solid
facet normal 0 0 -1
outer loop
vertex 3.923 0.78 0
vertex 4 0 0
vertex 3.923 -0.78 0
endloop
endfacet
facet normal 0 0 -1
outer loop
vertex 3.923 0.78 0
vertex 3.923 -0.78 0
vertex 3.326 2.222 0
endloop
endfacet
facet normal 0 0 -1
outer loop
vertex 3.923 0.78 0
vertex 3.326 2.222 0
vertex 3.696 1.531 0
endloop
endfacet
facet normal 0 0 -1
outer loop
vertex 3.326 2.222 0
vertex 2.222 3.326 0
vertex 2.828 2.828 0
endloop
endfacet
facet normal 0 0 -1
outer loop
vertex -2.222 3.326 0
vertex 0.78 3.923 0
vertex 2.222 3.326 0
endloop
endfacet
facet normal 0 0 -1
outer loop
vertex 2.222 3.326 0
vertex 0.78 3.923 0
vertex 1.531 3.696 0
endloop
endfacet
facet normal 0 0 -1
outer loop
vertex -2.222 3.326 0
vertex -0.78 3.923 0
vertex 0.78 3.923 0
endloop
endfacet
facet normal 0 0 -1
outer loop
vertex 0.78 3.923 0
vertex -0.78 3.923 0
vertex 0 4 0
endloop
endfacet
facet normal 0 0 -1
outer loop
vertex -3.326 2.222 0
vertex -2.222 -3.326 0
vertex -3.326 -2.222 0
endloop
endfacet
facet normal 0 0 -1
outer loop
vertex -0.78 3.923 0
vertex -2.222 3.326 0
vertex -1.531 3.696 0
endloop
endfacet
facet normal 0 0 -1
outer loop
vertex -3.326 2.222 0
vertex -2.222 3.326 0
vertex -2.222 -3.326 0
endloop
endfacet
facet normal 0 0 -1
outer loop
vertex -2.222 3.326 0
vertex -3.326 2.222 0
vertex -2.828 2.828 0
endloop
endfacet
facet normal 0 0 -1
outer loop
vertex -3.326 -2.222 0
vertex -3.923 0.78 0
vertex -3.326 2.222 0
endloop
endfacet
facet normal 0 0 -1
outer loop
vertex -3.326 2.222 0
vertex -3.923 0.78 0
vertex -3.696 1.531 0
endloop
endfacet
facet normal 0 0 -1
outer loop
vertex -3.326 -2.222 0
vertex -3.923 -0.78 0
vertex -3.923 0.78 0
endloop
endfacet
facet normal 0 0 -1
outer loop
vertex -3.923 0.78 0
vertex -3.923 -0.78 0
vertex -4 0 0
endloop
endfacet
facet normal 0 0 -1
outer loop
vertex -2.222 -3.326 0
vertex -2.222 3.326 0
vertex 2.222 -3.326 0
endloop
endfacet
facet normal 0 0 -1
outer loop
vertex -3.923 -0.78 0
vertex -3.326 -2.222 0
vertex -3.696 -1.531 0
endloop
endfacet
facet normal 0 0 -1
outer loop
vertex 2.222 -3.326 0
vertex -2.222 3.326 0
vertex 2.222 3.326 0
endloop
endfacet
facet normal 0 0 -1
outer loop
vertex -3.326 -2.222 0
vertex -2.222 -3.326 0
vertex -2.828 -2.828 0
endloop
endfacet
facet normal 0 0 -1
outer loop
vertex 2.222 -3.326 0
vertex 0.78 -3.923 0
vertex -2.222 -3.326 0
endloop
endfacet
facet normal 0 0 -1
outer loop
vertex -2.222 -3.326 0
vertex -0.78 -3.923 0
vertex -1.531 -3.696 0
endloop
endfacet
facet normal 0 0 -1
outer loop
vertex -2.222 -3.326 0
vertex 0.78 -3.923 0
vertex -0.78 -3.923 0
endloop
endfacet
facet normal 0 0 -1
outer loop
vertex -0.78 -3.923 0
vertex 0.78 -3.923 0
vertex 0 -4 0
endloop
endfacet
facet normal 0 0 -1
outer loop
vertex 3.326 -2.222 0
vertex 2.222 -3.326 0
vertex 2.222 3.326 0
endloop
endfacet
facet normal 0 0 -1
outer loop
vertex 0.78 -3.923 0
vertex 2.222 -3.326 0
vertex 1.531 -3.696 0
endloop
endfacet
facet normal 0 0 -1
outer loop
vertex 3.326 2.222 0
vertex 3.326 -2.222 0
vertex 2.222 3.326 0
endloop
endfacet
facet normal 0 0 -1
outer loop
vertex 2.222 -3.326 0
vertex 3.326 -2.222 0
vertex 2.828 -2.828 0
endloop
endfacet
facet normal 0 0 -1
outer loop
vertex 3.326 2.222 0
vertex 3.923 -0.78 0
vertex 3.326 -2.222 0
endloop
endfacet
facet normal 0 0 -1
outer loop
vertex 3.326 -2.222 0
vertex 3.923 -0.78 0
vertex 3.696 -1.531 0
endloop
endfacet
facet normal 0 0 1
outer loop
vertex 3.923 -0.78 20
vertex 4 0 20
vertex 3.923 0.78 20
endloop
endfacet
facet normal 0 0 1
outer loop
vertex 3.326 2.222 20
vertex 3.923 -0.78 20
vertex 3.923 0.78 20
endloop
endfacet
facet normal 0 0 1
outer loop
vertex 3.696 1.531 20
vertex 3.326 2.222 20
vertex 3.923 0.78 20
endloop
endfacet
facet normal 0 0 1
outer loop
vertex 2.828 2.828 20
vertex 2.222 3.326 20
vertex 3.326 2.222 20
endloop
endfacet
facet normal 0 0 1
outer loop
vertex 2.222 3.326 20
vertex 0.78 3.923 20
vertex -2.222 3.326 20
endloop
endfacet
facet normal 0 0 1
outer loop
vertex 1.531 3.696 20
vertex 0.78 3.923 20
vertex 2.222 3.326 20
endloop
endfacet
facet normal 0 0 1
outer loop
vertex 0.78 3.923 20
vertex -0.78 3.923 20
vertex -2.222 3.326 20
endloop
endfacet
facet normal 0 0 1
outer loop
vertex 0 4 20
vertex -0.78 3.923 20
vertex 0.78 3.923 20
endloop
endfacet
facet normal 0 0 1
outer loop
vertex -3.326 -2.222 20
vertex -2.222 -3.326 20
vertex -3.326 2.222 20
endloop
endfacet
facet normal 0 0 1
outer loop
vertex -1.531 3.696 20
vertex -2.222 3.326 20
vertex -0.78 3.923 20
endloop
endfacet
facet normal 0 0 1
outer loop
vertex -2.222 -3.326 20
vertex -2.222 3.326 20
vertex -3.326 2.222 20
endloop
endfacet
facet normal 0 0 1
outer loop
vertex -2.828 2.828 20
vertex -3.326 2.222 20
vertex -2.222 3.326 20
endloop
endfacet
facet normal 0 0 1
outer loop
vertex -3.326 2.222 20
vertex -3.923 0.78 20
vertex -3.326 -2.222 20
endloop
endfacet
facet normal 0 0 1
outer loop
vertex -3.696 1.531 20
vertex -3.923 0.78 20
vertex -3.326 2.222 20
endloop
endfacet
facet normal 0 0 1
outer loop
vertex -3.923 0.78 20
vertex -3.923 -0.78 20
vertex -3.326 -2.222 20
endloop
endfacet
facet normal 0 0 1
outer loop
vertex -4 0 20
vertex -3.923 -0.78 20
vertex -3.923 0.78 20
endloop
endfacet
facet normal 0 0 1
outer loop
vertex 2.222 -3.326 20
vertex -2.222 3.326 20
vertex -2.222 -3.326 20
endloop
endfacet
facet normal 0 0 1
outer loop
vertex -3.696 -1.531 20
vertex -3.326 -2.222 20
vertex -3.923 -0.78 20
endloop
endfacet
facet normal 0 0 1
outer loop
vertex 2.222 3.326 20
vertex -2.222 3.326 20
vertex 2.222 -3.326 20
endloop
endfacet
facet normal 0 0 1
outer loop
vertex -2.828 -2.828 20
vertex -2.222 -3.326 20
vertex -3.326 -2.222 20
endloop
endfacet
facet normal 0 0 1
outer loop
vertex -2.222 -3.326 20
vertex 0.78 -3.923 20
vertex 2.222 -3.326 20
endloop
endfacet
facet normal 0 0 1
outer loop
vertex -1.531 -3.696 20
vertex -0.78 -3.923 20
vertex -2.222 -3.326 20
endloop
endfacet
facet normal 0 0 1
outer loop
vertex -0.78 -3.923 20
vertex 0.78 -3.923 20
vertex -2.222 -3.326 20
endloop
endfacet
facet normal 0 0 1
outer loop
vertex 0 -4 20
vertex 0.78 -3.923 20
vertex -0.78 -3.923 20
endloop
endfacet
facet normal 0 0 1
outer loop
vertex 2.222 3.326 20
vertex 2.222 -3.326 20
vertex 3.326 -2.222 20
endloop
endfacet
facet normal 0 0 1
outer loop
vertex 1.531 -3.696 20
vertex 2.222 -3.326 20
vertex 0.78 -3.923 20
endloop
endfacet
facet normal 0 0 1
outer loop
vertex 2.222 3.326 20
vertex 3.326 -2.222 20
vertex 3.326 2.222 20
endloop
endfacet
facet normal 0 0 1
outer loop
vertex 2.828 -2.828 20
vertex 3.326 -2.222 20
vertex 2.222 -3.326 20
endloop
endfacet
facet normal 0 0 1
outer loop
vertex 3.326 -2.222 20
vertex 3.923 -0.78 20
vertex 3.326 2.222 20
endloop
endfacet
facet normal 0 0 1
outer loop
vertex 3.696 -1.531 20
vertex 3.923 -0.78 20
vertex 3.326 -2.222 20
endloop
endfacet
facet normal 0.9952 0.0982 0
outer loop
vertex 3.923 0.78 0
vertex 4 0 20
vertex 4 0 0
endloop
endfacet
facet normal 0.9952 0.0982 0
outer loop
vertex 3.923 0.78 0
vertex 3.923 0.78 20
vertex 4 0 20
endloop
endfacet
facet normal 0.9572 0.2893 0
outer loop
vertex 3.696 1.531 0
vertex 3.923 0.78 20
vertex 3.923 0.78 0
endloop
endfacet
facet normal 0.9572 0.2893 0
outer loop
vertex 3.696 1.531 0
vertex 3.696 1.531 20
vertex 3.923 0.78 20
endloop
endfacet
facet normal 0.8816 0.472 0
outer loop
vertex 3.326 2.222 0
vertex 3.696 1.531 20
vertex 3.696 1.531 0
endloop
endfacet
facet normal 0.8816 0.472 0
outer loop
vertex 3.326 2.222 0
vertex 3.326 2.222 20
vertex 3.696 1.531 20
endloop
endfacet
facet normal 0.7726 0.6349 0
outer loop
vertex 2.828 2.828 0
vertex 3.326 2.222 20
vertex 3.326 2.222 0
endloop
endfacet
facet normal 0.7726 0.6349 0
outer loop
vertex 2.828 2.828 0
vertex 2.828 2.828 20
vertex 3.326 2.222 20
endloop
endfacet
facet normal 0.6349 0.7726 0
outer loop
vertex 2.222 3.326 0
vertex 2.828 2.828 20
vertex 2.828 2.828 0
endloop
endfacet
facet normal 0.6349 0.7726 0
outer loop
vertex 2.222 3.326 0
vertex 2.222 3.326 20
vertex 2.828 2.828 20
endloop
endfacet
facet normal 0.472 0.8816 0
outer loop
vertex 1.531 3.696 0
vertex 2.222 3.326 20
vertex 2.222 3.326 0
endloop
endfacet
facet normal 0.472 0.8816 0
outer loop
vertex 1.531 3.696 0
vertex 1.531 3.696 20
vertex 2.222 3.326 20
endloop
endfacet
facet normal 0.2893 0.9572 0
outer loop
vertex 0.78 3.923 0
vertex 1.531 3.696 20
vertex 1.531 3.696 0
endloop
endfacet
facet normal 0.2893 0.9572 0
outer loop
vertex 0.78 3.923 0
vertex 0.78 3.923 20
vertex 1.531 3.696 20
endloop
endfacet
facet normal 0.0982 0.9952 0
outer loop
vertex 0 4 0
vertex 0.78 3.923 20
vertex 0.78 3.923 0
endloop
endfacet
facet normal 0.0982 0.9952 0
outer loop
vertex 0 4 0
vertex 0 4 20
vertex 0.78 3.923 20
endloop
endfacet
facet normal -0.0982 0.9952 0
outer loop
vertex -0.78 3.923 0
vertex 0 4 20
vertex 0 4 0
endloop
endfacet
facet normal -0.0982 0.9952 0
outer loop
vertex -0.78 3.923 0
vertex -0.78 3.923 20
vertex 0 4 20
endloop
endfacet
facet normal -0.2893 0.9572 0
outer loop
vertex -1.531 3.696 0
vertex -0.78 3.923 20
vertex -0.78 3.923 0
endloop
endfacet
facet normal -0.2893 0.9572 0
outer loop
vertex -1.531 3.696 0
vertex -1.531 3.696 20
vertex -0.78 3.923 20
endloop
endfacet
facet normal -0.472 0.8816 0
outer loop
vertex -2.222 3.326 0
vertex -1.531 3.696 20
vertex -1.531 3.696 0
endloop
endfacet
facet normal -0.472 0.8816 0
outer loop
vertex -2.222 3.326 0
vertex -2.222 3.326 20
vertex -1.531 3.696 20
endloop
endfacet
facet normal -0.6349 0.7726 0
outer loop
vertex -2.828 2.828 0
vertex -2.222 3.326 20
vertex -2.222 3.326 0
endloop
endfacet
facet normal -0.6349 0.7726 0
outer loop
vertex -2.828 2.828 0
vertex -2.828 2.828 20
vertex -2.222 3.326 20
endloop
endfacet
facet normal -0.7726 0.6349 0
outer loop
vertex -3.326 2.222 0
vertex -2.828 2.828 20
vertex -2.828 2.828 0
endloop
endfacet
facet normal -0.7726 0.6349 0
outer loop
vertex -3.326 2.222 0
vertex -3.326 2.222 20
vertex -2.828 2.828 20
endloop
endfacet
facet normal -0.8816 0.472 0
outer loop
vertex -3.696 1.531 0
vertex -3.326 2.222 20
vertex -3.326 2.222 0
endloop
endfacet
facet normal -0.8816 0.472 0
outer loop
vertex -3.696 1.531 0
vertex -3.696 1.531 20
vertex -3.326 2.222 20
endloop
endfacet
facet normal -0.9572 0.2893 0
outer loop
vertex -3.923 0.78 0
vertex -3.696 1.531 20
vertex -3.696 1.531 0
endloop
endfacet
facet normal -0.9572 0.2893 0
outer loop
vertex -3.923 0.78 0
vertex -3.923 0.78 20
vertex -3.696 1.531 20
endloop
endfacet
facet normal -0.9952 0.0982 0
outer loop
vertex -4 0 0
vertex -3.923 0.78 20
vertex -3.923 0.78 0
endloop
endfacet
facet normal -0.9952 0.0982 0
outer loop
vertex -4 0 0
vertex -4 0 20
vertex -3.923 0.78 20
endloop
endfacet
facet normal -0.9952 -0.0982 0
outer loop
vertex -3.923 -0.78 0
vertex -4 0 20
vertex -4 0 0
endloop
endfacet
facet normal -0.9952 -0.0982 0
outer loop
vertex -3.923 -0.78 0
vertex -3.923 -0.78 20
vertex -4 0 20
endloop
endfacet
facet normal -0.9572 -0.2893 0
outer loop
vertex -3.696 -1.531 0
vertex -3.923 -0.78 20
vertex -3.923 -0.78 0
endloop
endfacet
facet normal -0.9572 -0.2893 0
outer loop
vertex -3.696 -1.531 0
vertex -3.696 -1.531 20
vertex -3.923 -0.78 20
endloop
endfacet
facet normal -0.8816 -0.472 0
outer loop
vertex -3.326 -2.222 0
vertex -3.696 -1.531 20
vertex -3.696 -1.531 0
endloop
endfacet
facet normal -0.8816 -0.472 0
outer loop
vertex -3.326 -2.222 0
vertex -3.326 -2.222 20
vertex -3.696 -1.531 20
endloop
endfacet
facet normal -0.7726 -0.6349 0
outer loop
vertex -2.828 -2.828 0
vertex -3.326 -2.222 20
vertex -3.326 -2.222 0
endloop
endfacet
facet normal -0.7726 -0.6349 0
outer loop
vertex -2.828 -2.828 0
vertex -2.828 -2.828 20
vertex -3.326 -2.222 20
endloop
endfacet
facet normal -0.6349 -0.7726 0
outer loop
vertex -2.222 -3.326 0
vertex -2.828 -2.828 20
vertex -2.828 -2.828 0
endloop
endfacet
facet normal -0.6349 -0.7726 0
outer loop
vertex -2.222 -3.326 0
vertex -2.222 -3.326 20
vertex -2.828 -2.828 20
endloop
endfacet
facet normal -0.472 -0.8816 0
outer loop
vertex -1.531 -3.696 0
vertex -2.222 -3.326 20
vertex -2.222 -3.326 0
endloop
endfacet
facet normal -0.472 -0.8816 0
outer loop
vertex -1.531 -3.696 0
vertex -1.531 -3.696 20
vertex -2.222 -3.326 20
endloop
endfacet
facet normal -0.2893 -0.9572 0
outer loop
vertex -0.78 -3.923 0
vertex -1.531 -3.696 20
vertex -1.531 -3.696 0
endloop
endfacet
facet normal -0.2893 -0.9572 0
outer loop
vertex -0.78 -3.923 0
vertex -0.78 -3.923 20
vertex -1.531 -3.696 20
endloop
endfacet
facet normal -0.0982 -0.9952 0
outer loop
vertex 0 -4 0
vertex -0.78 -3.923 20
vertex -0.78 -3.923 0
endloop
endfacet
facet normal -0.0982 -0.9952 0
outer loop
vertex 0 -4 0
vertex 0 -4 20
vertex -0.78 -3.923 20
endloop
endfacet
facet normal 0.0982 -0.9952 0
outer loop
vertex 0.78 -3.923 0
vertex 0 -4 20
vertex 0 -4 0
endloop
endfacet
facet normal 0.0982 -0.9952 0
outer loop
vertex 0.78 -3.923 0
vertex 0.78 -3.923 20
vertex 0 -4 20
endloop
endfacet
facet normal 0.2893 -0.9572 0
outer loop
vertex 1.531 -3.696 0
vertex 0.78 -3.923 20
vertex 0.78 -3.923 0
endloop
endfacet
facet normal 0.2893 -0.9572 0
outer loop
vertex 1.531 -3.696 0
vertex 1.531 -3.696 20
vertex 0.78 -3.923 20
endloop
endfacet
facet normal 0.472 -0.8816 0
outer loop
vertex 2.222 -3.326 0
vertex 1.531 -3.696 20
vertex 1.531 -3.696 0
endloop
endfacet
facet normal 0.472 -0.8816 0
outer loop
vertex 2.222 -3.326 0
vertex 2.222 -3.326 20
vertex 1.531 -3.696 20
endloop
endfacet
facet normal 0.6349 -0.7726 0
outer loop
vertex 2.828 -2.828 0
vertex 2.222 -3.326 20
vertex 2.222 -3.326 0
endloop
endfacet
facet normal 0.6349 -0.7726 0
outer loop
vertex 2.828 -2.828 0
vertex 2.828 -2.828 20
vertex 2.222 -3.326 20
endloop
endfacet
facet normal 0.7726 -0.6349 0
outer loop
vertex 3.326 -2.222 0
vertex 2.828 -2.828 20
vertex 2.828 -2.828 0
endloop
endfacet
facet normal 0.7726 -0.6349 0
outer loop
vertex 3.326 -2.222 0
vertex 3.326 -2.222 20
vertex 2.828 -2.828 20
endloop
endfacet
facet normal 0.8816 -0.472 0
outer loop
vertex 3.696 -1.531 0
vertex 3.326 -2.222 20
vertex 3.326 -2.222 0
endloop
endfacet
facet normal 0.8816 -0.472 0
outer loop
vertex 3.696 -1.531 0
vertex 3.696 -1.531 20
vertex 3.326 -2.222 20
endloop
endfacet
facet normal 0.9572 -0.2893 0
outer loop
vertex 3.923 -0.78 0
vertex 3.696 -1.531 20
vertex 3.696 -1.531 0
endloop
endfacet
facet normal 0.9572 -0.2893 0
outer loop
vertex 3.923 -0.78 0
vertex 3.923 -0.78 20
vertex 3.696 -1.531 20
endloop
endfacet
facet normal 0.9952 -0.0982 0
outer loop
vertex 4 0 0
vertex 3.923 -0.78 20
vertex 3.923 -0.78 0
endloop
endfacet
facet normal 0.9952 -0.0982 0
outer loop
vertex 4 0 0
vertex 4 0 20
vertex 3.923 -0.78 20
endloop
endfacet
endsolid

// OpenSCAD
// A circle extruded obliquely: an elliptic cylinder, whose sections by the caps
// are the circle.
//
// linear_extrude(v = ...) carries every station of the profile along v, so the
// wall is the circle swept along a direction that is not its plane's normal. A
// circle swept is a cylinder over whatever section the sweep leaves it, and the
// section across v here is an ellipse, the circle foreshortened: major
// semi-axis 4, and minor 4 times the cosine of the angle between v and the
// normal. Until 2026-09-25 that was a
// refusal - "an oblique cylinder, not a CYLINDRICAL_SURFACE" - and the wall was
// facets. Now it is declared an EllipticCylinderSurface and written as the
// SURFACE_OF_LINEAR_EXTRUSION of that ellipse (SweptSurfaces.cc, extrudeArc).
// EXPECT: 1 analytic surface available (0 cylindrical, 0 spherical, 0 toroidal, 0 Bezier, 1 elliptic), and 2 declared planes
//
// Every vertex of the wall is the circle moved along v, so every facet is on it
// exactly, and the wall goes all the way round between its caps: one face,
// closed by a seam, each rim the whole section its cap's plane cuts.
// EXPECT: what decided each written facet: 32 D0, 0 D1, 0 D2, 0 D3, 0 D4
// EXPECT: 1 face round its axis between two rims closed by a seam along a ruling
// EXPECT: 2 plane sections written as the conic it is - 2 on a plane the model declared
// ROUNDTRIP: Plane=2 SurfaceOfExtrusion=1
//
// Derived: the height is measured along v, so the far cap stands 20 * 20 /
// sqrt(436) above the near one, and the solid is the disc of radius 4 times that
// height - Cavalieri: 16 pi * 400 / sqrt(436).
// VOLUME: 962.9120067
$fn = 32;
linear_extrude(height = 20, v = [6, 0, 20]) circle(r = 4);
